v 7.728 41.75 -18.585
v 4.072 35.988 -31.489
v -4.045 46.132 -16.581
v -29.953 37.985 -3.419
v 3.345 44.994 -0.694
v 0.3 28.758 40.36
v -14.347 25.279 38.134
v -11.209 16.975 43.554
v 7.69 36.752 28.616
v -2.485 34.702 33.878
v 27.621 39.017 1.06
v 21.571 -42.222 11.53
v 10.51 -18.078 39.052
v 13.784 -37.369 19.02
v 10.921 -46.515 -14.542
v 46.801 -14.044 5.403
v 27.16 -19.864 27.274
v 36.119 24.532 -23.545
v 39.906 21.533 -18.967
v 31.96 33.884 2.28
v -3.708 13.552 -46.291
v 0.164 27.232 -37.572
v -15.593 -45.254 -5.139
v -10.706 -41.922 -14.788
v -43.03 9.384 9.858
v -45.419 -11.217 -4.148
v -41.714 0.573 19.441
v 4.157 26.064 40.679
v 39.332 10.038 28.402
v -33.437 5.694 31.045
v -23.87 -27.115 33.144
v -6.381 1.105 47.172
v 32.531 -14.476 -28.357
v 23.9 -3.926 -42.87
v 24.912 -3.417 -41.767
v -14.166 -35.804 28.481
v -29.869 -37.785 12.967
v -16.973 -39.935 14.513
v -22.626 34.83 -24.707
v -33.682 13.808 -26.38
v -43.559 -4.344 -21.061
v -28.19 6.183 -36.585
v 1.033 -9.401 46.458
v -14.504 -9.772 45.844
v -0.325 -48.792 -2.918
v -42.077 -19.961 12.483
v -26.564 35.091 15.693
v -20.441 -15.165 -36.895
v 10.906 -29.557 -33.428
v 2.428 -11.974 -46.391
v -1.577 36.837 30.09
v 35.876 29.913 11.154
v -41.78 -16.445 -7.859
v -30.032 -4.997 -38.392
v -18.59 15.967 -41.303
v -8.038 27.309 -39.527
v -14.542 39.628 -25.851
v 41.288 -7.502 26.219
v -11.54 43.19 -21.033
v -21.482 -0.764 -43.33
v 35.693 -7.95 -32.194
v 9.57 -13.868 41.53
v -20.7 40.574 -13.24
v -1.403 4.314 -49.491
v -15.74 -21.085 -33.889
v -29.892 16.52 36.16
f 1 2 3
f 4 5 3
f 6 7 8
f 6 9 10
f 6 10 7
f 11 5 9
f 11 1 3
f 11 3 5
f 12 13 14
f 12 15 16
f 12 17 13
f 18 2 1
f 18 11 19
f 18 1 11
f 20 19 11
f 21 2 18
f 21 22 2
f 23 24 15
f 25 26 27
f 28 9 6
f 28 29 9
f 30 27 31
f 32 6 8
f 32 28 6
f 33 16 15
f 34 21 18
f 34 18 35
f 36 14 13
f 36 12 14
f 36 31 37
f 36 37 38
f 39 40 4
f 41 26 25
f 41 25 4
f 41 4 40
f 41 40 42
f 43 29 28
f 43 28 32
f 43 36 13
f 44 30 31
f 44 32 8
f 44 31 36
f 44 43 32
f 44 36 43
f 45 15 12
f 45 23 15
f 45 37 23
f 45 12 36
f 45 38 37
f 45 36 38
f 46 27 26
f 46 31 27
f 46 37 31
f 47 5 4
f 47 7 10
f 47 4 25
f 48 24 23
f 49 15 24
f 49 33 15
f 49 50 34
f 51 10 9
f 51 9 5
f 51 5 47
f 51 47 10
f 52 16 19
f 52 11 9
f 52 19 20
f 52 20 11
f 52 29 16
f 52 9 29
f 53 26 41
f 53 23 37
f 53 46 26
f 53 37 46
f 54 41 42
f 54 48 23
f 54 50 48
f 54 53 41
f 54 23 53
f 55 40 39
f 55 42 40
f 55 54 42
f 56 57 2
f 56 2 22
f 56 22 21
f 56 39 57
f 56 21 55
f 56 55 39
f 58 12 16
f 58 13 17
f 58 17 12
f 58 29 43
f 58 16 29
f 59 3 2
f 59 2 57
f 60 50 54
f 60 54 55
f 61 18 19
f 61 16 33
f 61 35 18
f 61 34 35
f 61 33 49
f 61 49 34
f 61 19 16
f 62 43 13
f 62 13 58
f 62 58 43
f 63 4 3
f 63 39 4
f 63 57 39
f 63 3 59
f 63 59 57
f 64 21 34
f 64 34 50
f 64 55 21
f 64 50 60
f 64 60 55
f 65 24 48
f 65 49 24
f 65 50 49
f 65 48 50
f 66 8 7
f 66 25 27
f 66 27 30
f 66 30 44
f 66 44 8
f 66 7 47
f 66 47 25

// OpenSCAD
dimension = 3;
maxNumberOfPoints = 500;
seed = 1;
radius = 50;

module end_of_parameters_dummy() {}


//BEGIN: use <pointhull.scad>;
function _slice(list,start,end=undef) =
    let(end = end==undef?len(list):end)
    [for(i=[start:1:end-1]) list[i]];

function _delete(list,pos) =
    let(l=len(list))
    pos == 0 ? [for(i=[1:1:l-1]) list[i]] :
    pos >= l-1 ? [for(i=[0:1:pos-1]) list[i]] :
    concat([for(i=[0:1:pos-1]) list[i]],
        [for(i=[pos+1:1:l-1]) list[i]]);

function _areCollinear(a,b,c) = cross(b-a,c-a) == [0,0,0];

function _areCoplanar(a,b,c,d) = (d-a)*cross(b-a,c-a) == 0;

function _findNoncollinear(list,point1,point2,pos=0) =
    pos >= len(list) ? undef :
    ! _areCollinear(point1,point2,list[pos]) ? pos :
    _findNoncollinear(list,point1,point2,pos=pos+1);

function _findNoncoplanar(list,point1,point2,point3,pos=0) =
   pos >= len(list) ? undef :
   ! _areCoplanar(point1,point2,point3,list[pos]) ? pos :
        _findNoncoplanar(list,point1,point2,point3,pos=pos+1);

function _isBoundedBy(a,face,strict=false) =
    cross(face[1]-face[0],face[2]-face[0])*(a-face[0]);

function _makeTet(a,b,c,d) =
    _isBoundedBy(d,[a,b,c]) >= 0 ?
        [[a,b,c],[b,a,d],[c,b,d],[a,c,d]] :
        [[c,b,a],[d,a,b],[d,b,c],[d,c,a]];

function _findTri(list) =
    let(l2=_unique(list))
    assert(len(list)>=3)
    let(a=list[0],
        b=list[1],
        l3=_slice(list,2),
        ci=_findNoncollinear(l3,a,b),
        c=assert(ci != undef) l3[ci],
        l4=_delete(l3,ci))
        [[a,b,c],l4];

function _findTet(list) =
    let(ft=_findTri(list),
        tri=ft[0],
        l4=ft[1],
        di=assert(len(l4)>0) _findNoncoplanar(l4,tri[0],tri[1],tri[2]),
        d=assert(di != undef) l4[di],
        l5=_delete(l4,di))
        [_makeTet(tri[0],tri[1],tri[2],d),l5];

function _find(list,value) =
    let(m=search([value],list,1)[0])
    m==[] ? undef : m;

function _unique(list,soFar=[],pos=0) =
    pos >= len(list) ? soFar :
    _find(soFar,list[pos]) == undef ? _unique(list,soFar=concat(soFar,[list[pos]]),pos=pos+1) :
    _unique(list,soFar=soFar,pos=pos+1);

function _makePointsAndFaces(triangles) =
    let(points=_unique([for(t=triangles) for(v=t) v]))
        [points, [for(t=triangles) [for(v=t) _find(points,v)]]];

function _sameSide(p1,p2, a,b) =
    let(cp1 = cross(b-a, p1-a),
        cp2 = cross(b-a, p2-a))
        cp1*cp2 >= 0;

function _insideTriangle(p, t) =
    _sameSide(p,t[0],t[1],t[2]) &&
    _sameSide(p,t[1],t[0],t[2]) &&
    _sameSide(p,t[2],t[0],t[1]);


function _satisfiesConstraint(p, triangle) =
    let(c=_isBoundedBy(p, triangle))
    c > 0 || (c == 0 && _insideTriangle(p, triangle));


function _insidePoly(p, triangles, pos=0) =
    pos >= len(triangles) ? true :
    !_satisfiesConstraint(p, triangles[pos]) ? false :
    _insidePoly(p, triangles, pos=pos+1);

function _haveEdge(triangles, e, pos=0) =
    pos >= len(triangles) ? false :
    e==[triangles[pos][0],triangles[pos][1]] ||
        e==[triangles[pos][1],triangles[pos][2]] ||
        e==[triangles[pos][2],triangles[pos][0]] ? true :
        _haveEdge(triangles, e, pos=pos+1);

function _outerEdges(triangles) =
        let(edges=[for(t=triangles) for(e=[[t[0],t[1]],
                [t[1],t[2]],
                [t[2],t[0]]]) e])
        [for(e=edges) if(undef == _find(edges,[e[1],e[0]])) e];

function _unlit(triangles, p) = [for(t=triangles) if(_isBoundedBy(p, t) >= 0) t];

function _addToHull(h, p) =
    let(unlit = _unlit(h,p),
        edges = _outerEdges(unlit))
        concat(unlit, [for(e=edges) [e[1],e[0],p]]);

function _expandHull(h, points, pos=0) =
    pos >= len(points) ? h :
    !_insidePoly(points[pos],h) ?  _expandHull(_addToHull(h,points[pos]),points,pos=pos+1) :
    _expandHull(h, points, pos=pos+1);

function pointHull3D(points) =
    let(ft=_findTet(points))
        _expandHull(ft[0], ft[1]);

function _findEdge(edges,point,pos=0) =
    pos >= len(edges) ? undef :
    edges[pos][0] == point ? pos :
    _findEdge(edges,point,pos=pos+1);

function _add1Edge(edgesAndSoFar) =
    let(edges=edgesAndSoFar[0],
        soFar=edgesAndSoFar[1],
        index=_findEdge(edges,soFar[len(soFar)-1]))
        assert(index!=undef)
        [_delete(edgesAndSoFar[0],index),concat(edgesAndSoFar[1],[edgesAndSoFar[0][index][1]])];

function _traceEdges(edgesAndSoFar) =
    len(edgesAndSoFar[0]) == 0 ? edgesAndSoFar[1] :
    _traceEdges(_add1Edge(edgesAndSoFar));

function pointHull2D(points) =
    let(
        p3d = concat([[0,0,1]], [for(p=points) [p[0],p[1],0]]),
        h = pointHull3D(p3d),
        edges = [for(t=h) if(t[0][2]==1 || t[1][2]==1 || t[2][2]==1)
                t[0][2]==1 ? [t[1],t[2]] :
                t[1][2]==1 ? [t[2],t[0]] :
                [t[0],t[1]]],
        trace = _traceEdges([edges,[edges[0][0]]])) [for(v=trace) [v[0],v[1]]];

module pointHull(points) {
    if (len(points[0])==2) {
        polygon(pointHull2D(points));
    }
    else {
        paf = _makePointsAndFaces(pointHull3D(points));
        polyhedron(points=paf[0],faces=paf[1]);
    }
}


//END: use <pointhull.scad>;



points0 = rands(-radius,radius,dimension*maxNumberOfPoints,seed);
points = [for (i=[0:maxNumberOfPoints-1]) let(p=[for(j=[0:dimension-1]) points0[i*dimension+j]]) if(norm(p)<=radius) p];

pointHull(points);
